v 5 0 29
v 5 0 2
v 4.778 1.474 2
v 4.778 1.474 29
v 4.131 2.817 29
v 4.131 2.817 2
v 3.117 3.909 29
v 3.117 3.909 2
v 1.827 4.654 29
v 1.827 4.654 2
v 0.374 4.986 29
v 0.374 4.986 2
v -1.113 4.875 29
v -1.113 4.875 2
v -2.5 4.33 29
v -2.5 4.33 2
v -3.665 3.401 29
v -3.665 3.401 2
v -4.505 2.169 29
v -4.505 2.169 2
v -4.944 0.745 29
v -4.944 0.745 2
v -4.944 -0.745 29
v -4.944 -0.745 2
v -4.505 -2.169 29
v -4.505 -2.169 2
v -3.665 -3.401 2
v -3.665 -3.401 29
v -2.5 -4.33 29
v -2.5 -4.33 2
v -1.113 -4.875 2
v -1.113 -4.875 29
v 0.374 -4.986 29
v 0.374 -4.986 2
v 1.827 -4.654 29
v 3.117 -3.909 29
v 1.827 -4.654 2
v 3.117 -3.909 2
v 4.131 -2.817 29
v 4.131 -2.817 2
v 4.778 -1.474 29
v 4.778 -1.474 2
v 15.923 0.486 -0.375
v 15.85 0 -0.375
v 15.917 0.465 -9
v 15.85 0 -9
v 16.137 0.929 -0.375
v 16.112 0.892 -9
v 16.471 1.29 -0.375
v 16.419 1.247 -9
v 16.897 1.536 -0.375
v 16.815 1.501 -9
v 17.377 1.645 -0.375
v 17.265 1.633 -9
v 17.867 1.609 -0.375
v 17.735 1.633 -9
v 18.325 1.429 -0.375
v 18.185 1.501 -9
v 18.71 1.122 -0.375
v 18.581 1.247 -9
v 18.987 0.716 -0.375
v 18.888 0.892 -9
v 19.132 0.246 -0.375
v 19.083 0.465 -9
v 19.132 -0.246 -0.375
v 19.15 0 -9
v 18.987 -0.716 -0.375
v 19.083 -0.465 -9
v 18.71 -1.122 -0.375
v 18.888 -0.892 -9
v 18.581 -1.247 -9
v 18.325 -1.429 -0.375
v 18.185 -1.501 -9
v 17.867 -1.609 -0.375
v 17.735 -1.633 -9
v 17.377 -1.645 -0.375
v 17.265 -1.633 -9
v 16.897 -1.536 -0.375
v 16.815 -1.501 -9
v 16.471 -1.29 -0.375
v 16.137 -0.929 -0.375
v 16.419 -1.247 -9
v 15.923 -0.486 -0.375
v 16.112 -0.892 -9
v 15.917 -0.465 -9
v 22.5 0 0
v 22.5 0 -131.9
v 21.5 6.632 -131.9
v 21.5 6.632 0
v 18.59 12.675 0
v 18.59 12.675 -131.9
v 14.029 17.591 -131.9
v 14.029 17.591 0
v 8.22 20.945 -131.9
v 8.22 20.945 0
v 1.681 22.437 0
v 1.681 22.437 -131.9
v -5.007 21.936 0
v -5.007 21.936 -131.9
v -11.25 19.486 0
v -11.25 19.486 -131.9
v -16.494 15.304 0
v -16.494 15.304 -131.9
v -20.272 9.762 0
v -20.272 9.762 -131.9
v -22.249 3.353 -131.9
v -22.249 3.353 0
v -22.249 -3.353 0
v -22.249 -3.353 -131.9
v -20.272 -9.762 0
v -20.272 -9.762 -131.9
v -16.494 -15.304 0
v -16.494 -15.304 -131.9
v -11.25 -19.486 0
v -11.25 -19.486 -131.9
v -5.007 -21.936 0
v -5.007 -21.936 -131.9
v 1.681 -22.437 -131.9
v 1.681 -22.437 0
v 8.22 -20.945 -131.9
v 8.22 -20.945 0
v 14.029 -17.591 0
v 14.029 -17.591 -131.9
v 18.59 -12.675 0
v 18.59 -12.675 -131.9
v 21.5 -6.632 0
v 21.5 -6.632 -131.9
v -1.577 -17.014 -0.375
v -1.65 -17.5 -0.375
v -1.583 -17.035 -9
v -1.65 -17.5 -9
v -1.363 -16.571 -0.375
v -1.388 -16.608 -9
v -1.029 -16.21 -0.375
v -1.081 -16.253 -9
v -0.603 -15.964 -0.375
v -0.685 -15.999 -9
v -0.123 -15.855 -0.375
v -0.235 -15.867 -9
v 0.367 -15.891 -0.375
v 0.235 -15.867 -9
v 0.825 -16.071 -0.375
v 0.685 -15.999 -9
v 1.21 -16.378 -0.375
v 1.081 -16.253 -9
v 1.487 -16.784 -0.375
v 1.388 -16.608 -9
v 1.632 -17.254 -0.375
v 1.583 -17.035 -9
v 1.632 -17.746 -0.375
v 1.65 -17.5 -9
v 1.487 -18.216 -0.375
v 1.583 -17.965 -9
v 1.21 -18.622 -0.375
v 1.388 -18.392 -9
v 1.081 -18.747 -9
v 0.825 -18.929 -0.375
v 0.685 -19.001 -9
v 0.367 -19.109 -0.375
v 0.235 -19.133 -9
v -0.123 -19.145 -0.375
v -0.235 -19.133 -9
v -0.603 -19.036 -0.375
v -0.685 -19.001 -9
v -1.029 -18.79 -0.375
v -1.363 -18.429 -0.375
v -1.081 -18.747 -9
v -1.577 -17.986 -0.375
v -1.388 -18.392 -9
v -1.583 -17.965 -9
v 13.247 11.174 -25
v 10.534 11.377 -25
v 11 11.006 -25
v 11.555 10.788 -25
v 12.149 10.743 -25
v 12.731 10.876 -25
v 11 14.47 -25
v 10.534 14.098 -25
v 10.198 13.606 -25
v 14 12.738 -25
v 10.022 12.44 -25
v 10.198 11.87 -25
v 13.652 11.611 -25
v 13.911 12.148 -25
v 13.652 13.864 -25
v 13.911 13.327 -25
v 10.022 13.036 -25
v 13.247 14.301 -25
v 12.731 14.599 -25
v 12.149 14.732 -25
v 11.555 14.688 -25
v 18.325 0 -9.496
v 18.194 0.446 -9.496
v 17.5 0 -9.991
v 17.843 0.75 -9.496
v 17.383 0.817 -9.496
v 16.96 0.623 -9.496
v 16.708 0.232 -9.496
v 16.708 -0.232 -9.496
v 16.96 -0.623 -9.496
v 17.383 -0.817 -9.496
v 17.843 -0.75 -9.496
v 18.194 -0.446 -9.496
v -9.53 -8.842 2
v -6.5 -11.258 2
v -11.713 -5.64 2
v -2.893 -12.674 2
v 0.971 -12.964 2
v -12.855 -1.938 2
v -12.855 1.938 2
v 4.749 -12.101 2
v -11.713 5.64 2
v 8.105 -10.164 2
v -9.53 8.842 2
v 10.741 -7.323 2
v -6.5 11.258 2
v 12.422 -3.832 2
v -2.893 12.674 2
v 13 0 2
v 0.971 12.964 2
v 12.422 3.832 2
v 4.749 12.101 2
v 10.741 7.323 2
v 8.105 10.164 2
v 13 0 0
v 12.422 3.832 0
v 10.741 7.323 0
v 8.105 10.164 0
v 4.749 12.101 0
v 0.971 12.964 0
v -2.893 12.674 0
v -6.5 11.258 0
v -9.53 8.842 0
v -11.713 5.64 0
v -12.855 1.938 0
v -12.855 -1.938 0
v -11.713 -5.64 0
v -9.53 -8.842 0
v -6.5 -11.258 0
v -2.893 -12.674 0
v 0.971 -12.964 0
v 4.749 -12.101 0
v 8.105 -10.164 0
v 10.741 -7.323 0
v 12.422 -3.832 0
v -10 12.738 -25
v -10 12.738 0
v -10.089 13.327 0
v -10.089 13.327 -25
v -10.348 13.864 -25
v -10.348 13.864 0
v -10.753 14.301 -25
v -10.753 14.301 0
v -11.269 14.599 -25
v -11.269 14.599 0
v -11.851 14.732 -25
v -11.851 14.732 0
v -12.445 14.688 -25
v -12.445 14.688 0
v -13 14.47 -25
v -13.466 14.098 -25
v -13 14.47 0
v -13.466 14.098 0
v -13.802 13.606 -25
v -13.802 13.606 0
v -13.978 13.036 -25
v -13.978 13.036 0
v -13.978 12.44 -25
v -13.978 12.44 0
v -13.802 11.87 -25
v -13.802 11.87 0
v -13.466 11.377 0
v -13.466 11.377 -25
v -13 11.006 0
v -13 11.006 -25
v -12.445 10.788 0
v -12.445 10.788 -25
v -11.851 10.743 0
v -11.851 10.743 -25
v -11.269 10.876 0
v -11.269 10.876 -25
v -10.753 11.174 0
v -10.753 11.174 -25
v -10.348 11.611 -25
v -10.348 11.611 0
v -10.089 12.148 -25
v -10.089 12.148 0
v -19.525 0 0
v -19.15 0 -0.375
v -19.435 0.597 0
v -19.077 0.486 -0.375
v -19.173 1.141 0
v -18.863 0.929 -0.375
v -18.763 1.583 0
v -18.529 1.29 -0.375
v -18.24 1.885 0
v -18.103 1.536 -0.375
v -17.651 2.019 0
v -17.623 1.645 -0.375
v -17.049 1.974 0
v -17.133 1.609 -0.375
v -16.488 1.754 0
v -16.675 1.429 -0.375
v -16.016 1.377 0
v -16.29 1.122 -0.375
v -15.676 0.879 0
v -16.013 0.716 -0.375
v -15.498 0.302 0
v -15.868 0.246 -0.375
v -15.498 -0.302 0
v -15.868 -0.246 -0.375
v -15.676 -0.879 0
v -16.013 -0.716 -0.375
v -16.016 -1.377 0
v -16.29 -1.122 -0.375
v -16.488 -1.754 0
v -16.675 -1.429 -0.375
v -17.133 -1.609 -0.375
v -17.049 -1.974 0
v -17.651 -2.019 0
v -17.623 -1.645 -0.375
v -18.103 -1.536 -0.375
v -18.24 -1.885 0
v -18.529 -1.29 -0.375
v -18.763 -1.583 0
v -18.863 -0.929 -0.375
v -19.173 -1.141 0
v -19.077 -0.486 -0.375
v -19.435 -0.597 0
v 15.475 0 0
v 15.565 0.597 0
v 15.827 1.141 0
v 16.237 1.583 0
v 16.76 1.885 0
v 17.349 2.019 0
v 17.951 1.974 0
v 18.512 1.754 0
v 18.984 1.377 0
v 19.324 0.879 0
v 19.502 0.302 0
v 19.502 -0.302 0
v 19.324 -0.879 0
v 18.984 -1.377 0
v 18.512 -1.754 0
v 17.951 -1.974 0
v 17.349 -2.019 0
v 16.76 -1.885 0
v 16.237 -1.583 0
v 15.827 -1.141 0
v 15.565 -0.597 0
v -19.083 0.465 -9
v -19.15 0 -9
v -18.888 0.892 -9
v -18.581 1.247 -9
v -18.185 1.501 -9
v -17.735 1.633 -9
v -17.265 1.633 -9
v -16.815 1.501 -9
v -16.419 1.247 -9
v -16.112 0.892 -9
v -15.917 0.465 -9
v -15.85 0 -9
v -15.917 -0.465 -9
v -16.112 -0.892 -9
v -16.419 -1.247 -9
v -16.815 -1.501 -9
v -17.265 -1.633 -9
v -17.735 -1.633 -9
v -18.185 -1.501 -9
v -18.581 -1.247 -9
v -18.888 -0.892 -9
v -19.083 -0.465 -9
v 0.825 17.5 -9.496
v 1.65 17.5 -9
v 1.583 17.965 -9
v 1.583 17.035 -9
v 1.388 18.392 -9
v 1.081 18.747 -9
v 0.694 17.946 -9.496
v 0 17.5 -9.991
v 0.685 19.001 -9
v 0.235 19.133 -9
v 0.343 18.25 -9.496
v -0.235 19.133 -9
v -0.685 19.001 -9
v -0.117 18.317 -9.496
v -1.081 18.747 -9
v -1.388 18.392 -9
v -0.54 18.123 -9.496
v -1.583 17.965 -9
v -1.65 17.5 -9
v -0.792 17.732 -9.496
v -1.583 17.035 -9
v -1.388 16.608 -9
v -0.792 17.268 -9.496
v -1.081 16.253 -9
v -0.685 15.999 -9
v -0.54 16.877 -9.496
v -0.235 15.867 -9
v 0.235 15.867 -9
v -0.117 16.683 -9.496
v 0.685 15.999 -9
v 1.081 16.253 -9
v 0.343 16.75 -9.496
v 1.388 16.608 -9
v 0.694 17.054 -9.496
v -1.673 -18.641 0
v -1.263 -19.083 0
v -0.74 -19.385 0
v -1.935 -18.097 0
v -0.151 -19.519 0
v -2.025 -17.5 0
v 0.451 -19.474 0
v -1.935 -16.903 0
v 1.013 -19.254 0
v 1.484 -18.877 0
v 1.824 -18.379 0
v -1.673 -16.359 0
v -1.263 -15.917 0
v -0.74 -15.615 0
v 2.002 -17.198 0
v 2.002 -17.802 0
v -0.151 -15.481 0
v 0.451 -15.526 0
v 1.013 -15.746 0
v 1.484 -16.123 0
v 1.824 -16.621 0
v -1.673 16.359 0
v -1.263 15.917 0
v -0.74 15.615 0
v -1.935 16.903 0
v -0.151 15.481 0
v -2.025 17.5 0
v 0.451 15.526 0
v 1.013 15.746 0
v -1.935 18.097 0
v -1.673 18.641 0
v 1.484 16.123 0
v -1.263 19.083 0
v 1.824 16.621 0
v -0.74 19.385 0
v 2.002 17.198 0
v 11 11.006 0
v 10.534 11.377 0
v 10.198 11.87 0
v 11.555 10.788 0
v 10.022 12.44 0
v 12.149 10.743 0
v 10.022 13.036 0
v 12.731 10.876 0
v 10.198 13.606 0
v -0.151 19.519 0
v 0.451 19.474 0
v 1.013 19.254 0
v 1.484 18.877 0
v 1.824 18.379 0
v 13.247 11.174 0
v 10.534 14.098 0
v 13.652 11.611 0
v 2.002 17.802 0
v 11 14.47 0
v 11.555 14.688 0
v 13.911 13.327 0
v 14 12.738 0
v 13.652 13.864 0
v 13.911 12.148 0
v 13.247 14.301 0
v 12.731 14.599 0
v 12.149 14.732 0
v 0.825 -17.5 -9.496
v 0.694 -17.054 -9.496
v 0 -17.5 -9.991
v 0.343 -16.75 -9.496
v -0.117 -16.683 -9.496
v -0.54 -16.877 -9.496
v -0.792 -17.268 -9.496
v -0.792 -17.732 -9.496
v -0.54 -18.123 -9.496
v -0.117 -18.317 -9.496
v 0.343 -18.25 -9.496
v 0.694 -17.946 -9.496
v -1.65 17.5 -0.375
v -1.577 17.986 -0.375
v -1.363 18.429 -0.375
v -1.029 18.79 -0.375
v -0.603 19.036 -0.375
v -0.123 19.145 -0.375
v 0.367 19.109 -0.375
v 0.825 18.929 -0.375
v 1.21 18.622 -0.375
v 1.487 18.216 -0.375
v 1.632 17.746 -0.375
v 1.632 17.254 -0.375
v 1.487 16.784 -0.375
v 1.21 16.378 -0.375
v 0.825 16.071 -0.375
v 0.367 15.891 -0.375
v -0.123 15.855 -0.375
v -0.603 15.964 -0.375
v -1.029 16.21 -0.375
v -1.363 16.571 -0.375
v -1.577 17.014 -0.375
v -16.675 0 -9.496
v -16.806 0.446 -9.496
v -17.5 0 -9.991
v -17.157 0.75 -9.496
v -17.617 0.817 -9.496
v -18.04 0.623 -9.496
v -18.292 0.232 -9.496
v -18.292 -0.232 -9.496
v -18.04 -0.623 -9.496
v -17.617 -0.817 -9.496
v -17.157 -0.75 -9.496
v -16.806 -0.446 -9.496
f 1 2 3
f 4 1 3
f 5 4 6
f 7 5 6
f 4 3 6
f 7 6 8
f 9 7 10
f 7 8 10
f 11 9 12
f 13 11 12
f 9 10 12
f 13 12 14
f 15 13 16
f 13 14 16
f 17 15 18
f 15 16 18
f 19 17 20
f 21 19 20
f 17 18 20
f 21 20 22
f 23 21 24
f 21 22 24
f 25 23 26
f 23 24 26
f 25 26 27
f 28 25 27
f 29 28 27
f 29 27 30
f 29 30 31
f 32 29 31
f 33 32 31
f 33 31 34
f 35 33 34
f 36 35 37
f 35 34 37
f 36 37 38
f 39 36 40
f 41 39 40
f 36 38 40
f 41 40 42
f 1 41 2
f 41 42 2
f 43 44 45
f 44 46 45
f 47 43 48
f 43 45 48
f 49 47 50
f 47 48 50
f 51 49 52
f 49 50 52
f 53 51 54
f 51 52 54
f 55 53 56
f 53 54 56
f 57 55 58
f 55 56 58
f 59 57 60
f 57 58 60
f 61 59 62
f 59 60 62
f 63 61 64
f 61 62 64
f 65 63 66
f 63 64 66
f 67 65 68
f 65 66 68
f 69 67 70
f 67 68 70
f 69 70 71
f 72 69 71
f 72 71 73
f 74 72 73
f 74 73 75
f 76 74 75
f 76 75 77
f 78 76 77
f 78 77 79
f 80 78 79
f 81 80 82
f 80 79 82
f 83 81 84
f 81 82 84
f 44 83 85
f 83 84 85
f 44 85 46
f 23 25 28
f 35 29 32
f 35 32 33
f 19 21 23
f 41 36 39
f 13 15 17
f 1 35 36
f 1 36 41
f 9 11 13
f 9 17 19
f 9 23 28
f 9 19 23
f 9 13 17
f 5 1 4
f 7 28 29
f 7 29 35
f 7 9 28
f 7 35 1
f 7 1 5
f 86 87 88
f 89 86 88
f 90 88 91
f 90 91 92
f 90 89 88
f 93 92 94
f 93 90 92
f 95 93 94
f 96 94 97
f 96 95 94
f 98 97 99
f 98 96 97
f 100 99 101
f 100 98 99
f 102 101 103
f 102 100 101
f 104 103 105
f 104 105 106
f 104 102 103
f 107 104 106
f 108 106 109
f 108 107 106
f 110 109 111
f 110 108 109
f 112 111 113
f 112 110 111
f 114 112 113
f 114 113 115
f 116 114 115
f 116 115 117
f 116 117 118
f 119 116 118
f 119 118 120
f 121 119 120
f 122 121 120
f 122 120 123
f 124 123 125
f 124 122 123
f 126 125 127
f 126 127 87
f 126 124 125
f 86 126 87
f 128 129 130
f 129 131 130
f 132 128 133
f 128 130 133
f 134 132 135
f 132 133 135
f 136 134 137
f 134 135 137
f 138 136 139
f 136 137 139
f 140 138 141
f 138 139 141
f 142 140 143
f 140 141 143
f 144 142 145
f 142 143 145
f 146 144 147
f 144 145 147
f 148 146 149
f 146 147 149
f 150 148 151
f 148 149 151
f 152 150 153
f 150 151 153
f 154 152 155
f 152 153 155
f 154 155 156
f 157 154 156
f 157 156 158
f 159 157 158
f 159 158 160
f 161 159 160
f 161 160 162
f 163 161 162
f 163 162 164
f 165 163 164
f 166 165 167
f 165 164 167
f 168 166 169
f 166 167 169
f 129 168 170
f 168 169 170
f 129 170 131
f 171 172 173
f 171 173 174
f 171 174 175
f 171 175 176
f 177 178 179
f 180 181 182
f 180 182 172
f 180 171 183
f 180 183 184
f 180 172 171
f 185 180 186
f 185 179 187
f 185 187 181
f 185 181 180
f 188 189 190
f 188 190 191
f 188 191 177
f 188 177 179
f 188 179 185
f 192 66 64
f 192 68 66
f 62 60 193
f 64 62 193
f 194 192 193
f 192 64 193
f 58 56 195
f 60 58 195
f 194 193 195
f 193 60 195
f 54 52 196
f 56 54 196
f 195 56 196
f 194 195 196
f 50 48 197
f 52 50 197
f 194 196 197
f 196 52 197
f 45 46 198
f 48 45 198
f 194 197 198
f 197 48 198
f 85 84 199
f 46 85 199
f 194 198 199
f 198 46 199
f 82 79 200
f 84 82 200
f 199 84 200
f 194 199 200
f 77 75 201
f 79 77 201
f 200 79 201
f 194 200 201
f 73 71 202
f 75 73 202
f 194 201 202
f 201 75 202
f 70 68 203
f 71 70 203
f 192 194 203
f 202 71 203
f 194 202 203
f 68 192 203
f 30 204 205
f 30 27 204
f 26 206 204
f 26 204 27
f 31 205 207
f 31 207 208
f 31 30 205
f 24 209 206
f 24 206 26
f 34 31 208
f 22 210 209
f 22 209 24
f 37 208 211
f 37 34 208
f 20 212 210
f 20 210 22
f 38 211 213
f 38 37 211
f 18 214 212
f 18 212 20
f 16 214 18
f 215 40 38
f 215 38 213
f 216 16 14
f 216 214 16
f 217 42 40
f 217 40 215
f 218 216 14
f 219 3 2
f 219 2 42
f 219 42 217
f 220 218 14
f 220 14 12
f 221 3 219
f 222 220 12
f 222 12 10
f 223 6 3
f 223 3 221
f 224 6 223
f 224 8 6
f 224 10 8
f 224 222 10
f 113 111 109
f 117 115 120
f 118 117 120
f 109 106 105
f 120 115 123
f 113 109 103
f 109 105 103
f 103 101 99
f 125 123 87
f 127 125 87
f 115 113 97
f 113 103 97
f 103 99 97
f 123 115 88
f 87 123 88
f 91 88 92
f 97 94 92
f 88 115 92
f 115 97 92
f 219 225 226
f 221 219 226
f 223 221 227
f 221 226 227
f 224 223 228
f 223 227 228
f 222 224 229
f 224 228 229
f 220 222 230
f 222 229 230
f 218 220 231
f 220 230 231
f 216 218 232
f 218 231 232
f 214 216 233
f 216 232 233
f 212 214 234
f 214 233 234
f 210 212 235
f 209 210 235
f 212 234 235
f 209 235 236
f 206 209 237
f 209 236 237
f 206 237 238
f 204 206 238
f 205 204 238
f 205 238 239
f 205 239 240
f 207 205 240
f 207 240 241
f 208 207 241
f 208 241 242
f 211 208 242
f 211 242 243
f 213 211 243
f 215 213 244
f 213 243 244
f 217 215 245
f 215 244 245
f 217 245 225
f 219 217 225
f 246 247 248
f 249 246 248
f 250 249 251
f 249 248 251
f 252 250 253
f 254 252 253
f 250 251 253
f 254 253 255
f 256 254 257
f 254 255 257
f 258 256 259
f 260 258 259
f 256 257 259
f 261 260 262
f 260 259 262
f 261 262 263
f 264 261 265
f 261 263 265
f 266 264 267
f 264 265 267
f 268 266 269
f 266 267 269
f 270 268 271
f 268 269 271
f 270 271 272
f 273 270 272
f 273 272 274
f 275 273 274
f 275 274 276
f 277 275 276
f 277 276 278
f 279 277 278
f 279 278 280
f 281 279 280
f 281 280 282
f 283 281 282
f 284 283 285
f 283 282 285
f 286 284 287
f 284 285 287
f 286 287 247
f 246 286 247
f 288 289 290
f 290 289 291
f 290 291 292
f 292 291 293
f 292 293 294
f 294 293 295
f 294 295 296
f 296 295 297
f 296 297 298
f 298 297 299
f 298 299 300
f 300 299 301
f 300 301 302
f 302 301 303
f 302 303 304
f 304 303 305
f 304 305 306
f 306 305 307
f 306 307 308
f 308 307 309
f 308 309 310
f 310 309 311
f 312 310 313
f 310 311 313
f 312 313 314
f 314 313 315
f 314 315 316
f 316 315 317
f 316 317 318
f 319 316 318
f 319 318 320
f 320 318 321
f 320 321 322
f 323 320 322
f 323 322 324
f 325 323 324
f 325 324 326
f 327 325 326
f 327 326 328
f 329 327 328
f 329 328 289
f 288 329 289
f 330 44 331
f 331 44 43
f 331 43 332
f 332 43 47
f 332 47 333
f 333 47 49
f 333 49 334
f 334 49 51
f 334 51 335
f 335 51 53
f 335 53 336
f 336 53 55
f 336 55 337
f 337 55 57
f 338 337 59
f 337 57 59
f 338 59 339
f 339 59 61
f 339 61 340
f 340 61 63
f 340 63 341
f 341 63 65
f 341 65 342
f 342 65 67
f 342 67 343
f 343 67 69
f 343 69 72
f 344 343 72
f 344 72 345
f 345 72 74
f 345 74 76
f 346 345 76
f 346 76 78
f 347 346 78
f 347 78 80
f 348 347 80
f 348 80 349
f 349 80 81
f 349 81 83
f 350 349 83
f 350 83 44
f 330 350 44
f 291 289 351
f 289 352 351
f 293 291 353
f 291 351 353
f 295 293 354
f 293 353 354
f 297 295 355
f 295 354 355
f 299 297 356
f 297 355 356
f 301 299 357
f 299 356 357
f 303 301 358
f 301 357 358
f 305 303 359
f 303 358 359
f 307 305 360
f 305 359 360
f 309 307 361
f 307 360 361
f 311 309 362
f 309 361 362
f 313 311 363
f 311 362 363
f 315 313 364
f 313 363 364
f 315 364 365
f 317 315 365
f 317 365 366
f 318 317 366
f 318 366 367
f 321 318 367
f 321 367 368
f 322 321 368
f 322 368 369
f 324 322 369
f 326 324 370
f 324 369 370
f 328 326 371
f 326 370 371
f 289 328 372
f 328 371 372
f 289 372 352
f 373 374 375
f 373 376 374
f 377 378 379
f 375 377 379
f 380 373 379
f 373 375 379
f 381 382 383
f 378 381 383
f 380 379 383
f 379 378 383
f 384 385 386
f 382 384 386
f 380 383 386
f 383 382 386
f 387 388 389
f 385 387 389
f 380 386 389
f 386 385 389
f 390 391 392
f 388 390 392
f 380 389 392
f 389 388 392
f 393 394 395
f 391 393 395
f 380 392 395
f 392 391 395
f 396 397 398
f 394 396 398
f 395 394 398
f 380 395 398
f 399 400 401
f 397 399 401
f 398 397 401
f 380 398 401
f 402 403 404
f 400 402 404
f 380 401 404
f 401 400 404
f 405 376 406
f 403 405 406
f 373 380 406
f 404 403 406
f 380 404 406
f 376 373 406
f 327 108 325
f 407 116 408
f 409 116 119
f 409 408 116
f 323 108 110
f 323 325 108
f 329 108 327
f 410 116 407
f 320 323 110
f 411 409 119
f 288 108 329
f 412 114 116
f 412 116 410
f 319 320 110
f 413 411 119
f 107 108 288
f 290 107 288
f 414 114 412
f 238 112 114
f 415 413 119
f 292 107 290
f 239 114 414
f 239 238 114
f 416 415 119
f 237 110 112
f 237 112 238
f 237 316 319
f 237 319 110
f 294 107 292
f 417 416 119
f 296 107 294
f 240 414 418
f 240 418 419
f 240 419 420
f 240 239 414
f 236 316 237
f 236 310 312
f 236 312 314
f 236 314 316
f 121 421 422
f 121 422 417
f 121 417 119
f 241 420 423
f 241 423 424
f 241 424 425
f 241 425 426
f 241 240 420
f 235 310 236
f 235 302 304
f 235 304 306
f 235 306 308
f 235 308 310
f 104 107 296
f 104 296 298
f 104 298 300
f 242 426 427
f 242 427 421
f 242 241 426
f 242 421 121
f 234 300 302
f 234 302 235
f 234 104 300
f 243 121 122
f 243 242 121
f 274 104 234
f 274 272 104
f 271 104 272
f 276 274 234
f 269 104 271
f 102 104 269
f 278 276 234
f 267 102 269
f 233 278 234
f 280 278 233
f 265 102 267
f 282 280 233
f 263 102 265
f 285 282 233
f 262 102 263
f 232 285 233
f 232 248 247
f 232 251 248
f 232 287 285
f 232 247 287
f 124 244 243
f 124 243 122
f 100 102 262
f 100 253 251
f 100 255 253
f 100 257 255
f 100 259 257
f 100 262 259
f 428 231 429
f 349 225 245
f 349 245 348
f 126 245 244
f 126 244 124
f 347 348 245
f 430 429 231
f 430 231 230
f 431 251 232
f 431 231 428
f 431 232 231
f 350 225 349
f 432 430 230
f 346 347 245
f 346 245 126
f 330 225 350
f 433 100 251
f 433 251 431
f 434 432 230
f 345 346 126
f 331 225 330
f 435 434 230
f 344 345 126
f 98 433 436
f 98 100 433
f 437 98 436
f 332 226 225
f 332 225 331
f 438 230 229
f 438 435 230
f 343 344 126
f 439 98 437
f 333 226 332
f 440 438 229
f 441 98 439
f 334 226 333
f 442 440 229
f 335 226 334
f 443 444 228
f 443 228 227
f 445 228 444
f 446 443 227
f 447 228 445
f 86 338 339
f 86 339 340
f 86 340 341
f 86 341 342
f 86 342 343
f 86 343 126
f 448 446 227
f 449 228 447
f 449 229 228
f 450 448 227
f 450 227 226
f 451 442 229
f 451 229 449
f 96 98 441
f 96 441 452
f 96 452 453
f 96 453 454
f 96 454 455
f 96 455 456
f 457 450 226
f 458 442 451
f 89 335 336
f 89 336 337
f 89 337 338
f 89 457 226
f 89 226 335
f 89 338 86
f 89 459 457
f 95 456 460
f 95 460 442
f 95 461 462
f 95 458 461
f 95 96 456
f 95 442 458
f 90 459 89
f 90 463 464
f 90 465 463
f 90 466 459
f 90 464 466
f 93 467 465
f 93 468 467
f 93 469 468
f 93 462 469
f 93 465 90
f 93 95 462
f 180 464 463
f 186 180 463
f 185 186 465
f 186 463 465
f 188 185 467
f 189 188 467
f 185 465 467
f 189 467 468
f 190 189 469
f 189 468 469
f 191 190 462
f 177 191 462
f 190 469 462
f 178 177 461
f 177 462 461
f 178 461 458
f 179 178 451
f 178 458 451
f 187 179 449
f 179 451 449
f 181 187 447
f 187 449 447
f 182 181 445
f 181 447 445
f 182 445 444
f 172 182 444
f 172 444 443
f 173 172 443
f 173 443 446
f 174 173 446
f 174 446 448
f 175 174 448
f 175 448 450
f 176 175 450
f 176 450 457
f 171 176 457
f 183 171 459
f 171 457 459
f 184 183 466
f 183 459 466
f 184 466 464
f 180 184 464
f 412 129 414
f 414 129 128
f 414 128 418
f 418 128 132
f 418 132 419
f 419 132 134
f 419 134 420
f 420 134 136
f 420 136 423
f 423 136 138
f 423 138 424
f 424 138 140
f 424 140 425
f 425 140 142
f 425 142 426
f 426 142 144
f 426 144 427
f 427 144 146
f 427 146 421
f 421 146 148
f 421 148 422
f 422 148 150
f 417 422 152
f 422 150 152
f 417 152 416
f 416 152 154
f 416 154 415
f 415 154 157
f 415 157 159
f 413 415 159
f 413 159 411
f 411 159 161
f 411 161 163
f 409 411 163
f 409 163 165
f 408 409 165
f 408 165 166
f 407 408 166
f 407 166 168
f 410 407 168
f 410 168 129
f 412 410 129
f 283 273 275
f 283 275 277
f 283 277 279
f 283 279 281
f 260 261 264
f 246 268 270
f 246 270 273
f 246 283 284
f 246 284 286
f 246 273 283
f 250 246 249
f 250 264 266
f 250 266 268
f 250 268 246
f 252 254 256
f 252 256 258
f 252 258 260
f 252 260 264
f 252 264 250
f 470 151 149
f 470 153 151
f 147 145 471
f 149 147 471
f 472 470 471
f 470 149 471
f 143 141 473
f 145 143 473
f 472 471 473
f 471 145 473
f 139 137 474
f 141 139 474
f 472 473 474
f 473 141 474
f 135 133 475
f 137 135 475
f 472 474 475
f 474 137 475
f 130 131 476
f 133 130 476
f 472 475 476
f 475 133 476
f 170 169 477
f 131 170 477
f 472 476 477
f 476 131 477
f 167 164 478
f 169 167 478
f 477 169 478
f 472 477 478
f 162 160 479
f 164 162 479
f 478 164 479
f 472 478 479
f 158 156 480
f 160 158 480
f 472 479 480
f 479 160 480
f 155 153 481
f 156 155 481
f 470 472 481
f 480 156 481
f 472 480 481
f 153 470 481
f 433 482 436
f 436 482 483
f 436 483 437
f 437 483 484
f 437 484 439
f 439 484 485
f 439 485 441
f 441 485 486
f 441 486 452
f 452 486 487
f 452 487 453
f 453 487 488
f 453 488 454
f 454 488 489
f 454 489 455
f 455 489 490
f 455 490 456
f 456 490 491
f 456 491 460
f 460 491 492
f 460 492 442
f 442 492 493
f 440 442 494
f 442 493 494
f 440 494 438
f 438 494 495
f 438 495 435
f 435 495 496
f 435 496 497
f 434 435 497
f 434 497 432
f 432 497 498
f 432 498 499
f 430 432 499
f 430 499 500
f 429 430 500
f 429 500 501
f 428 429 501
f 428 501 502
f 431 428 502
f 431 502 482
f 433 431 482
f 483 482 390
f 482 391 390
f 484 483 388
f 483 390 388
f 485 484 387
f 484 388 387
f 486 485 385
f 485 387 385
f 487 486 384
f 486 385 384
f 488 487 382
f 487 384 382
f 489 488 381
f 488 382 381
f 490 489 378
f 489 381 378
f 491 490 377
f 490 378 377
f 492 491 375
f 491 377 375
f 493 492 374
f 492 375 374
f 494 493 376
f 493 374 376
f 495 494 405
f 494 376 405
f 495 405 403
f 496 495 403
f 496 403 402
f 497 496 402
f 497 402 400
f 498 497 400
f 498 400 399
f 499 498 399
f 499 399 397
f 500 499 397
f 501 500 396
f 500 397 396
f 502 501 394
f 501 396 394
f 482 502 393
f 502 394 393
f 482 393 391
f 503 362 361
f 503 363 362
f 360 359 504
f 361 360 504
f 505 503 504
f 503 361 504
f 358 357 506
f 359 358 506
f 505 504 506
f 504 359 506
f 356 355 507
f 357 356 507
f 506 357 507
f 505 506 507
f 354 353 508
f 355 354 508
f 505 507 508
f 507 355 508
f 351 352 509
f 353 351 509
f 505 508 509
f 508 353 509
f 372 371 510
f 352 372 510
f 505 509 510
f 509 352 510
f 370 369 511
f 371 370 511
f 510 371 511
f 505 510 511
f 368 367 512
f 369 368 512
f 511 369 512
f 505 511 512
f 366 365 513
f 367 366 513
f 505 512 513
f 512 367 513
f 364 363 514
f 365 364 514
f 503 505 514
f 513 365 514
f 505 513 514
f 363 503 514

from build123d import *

# Parameters (mm, degrees)
SKETCH1_R                   = 22.5
BOSS_EXTRUDE1_DEPTH         = 131.9
SKETCH2_R                   = 13
BOSS_EXTRUDE2_DEPTH         = 2
SKETCH3_R                   = 5
BOSS_EXTRUDE3_DEPTH         = 27
M4_TAPPED_HOLE1_D           = 3.3
M4_TAPPED_HOLE1_DEPTH       = 9
M4_TAPPED_HOLE1_CSINK_D     = 4.05
M4_TAPPED_HOLE1_CSINK_ANGLE = 90
M4_TAPPED_HOLE1_TIP         = 0.991420021
SKETCH7_R                   = 2
CUT_EXTRUDE1_DEPTH          = 25


with BuildPart() as part:
    # Sketch1 → Boss-Extrude1 (new body)
    with BuildSketch(Plane.XY):
        Circle(SKETCH1_R)
    extrude(amount=-BOSS_EXTRUDE1_DEPTH)

    # Sketch2 → Boss-Extrude2 (add)
    with BuildSketch(Plane.XY):
        Circle(SKETCH2_R)
    extrude(amount=BOSS_EXTRUDE2_DEPTH)

    # Sketch3 → Boss-Extrude3 (add)
    with BuildSketch(Plane.XY.offset(2)):
        Circle(SKETCH3_R)
    extrude(amount=BOSS_EXTRUDE3_DEPTH)

    # M4 Tapped Hole1
    with Locations(Plane.XY):
        with Locations((0, 17.5), (-17.5, 0), (0, -17.5), (17.5, 0)):
            CounterSinkHole(M4_TAPPED_HOLE1_D / 2, M4_TAPPED_HOLE1_CSINK_D / 2, depth=M4_TAPPED_HOLE1_DEPTH, counter_sink_angle=M4_TAPPED_HOLE1_CSINK_ANGLE)
            with Locations((0, 0, -(M4_TAPPED_HOLE1_DEPTH + M4_TAPPED_HOLE1_TIP / 2))):  # 118° drill point
                Cone(0, M4_TAPPED_HOLE1_D / 2, M4_TAPPED_HOLE1_TIP, mode=Mode.SUBTRACT)

    # Sketch7 → Cut-Extrude1 (cut)
    with BuildSketch(Plane.XY):
        with Locations((-12, 12.737739203)):
            Circle(SKETCH7_R)
        with Locations((12, 12.737739203)):
            Circle(SKETCH7_R)
    extrude(amount=-CUT_EXTRUDE1_DEPTH, mode=Mode.SUBTRACT)


solid = part.part
